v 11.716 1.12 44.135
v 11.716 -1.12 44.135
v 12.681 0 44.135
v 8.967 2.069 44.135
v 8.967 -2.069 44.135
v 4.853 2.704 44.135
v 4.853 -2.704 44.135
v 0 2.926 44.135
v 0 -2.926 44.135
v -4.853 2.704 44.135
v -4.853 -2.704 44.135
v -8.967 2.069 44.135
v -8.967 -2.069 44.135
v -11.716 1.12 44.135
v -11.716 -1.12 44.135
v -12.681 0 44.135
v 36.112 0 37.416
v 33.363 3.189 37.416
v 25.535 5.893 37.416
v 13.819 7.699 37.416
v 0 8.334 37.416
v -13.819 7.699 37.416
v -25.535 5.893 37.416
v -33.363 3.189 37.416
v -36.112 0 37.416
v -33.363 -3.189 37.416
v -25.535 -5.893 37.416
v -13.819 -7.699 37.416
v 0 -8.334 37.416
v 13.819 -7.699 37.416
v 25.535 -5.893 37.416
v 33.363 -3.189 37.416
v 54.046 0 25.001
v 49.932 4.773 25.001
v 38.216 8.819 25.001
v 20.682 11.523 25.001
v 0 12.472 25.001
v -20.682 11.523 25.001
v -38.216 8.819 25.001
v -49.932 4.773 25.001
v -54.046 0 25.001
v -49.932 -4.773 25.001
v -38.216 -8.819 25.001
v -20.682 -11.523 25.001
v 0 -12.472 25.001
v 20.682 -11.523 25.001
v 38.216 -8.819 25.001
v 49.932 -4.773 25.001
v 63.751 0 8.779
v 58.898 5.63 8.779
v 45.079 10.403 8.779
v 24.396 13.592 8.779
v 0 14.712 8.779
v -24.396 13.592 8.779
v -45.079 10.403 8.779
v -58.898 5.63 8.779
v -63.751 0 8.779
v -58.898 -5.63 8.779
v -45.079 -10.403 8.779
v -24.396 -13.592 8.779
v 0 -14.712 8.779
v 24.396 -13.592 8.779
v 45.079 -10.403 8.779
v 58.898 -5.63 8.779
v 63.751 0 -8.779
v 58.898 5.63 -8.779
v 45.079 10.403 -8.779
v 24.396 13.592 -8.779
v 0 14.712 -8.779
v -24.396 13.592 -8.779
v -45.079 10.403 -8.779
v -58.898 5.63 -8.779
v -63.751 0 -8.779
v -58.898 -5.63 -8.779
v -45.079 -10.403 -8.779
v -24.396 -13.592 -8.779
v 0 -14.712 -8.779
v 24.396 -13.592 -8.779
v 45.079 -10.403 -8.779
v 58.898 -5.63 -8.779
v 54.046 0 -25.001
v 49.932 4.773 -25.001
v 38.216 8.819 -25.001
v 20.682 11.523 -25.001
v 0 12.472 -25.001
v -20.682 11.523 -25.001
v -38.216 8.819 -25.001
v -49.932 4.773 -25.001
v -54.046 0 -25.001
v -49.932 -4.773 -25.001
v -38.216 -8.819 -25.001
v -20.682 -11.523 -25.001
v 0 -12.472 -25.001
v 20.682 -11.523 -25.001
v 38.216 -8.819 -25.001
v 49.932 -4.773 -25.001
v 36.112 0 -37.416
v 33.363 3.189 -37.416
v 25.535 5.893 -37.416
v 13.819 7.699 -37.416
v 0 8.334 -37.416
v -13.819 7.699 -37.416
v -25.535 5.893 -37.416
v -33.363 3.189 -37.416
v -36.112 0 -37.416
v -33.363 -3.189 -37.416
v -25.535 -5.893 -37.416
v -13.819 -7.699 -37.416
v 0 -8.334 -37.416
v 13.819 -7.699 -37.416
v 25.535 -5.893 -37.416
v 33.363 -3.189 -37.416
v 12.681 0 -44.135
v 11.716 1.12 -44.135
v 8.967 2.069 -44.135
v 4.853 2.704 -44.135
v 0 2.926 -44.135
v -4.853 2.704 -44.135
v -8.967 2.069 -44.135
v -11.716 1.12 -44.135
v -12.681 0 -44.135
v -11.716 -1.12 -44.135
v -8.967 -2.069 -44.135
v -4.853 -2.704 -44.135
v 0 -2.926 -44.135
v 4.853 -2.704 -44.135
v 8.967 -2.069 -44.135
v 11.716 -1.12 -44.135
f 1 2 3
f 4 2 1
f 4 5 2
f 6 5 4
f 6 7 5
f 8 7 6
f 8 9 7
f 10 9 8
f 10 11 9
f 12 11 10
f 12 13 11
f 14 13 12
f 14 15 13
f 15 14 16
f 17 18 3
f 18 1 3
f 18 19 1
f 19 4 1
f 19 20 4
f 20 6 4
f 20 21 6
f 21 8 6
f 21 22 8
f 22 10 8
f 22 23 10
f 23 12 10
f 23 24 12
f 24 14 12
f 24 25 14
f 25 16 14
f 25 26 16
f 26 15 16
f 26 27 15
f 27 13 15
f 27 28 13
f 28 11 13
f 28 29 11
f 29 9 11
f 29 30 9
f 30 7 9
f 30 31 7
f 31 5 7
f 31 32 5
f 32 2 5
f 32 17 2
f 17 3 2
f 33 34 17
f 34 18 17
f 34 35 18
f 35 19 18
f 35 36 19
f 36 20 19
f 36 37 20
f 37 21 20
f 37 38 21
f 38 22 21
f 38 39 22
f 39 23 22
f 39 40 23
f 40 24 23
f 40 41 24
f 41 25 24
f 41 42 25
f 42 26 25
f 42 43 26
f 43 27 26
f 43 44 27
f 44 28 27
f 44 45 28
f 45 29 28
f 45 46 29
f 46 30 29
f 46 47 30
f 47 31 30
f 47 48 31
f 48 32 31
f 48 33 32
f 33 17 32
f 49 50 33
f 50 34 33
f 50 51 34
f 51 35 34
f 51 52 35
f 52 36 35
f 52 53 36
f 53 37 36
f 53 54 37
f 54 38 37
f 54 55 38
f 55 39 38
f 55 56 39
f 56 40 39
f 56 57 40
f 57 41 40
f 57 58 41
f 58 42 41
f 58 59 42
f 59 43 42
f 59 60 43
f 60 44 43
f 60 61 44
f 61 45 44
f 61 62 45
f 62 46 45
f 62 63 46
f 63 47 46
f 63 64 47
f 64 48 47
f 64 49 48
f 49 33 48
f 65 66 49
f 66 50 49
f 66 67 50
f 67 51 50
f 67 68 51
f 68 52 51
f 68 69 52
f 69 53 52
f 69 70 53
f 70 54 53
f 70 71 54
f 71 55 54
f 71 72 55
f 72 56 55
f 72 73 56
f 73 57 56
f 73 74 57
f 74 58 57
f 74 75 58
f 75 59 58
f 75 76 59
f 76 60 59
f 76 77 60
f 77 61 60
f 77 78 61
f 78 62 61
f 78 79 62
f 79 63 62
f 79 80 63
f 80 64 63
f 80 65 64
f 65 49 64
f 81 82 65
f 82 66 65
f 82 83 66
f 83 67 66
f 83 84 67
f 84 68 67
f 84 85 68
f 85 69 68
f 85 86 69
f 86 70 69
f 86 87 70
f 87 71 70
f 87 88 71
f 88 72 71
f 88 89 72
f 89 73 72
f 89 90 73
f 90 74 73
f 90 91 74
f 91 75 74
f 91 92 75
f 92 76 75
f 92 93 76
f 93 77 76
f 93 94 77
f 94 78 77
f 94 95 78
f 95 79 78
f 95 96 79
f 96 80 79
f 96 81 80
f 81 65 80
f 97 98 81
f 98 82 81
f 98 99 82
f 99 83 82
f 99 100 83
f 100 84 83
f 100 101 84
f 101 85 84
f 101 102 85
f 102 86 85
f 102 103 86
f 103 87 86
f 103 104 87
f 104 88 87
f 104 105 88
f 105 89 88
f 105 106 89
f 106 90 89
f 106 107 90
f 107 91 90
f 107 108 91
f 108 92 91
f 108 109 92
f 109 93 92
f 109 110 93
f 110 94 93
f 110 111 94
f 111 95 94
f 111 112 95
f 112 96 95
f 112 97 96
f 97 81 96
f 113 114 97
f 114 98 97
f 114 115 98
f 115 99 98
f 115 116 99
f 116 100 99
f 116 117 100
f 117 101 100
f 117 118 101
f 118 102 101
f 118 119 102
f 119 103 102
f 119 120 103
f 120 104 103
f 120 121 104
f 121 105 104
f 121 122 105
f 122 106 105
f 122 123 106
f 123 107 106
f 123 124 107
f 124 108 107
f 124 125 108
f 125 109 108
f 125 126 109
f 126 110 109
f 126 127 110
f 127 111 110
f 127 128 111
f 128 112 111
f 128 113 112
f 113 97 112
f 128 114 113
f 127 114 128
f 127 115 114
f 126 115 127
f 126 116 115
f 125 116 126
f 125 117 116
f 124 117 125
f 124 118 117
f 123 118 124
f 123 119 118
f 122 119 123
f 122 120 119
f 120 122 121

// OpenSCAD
// Generated by SolidPython 1.0.1 on 2020-07-29 00:46:50


scale(v = [13, 3, 9]) {
	sphere(r = 5);
}
/***********************************************
*********      SolidPython code:      **********
************************************************
 
# import packages: SolidPython
from solid import *
from solid.utils import *
from itertools import chain, combinations, permutations


class Resize:

    def __init__(self, scad_file):
        self.scad_file = scad_file
        #self.scad_file = import_scad(scad_file)
        # cone/cylinder param:
        self.r1 = 0
        self.r2 = 0
        self.h = 0
        # rectangular prism param:
        self.w = 0
        self.l = 0
        # ellipse param:
        self.r = 0

    # import OpenScad code (file name corresponds to shape)


    # classify shape + parameters
    def assign(self, param1, param2, param3):
        if self.scad_file == 'cone.scad':
            self.r1 = param1
            self.r2 = param2
            self.h = param3
        elif self.scad_file == 'cylinder.scad':
            self.r1 = param1
            self.r2 = param2
            self.h = param3
        elif self.scad_file == 'rectangularPrism.scad':
            self.h = param1
            self.l = param2
            self.w = param3
        else:
            self.r = param1
            self.h = param2

    # resize parameters
    def iterate(self):
        x = range(3, 20, 2)
        i = 1
        if self.scad_file == 'cone.scad':
            tempList = list(permutations(x, 2))
            for temp in tempList:
                param1 = temp[0]
                param2 = temp[1]
                filepath = 'produced_scad_files/' + 'cone' + str(param1) + '_' + str(param2) + '_' + '.scad'
                scad_render_to_file(cylinder(h=param1, r1=param2, r2=0), filepath)

        elif self.scad_file == 'cylinder.scad':
            tempList = list(permutations(x, 3))
            for temp in tempList:
                param1 = temp[0]
                param2 = temp[1]
                filepath = 'produced_scad_files/' + 'cylinder' + str(param1) + '_' + str(param2) + '_' + '.scad'
                scad_render_to_file(cylinder(h=param1, r1=param2, r2=param2), filepath)

        elif self.scad_file == 'rectangularPrism.scad':
            tempList = list(permutations(x, 3))
            for temp in tempList:
                param1 = temp[0]
                param2 = temp[1]
                param3 = temp[2]
                filepath = 'produced_scad_files/' + 'rectangularPrism' + str(param1) + '_' + str(param2) + '_' + str(
                    param3) + '.scad'
                scad_render_to_file(cube(size=(param1, param2, param3)), filepath)

        elif self.scad_file == 'ellipse.scad':
            tempList = list(permutations(x, 4))
            for temp in tempList:
                param1 = temp[0]
                param2 = temp[1]
                param3 = temp[2]
                param4 = temp[3]
                filepath = 'produced_scad_files/' + 'ellipse' + str(param1) + '_' + str(param2) + '_' + str(param3) + '_' + str(param4) + '.scad'
                scad_render_to_file(scale([param1, param2, param3])(sphere(r=param4)), filepath)

    def render_to_scadfile(self):
        scad_render_to_file(scad, 'example.scad') 
 
************************************************/
